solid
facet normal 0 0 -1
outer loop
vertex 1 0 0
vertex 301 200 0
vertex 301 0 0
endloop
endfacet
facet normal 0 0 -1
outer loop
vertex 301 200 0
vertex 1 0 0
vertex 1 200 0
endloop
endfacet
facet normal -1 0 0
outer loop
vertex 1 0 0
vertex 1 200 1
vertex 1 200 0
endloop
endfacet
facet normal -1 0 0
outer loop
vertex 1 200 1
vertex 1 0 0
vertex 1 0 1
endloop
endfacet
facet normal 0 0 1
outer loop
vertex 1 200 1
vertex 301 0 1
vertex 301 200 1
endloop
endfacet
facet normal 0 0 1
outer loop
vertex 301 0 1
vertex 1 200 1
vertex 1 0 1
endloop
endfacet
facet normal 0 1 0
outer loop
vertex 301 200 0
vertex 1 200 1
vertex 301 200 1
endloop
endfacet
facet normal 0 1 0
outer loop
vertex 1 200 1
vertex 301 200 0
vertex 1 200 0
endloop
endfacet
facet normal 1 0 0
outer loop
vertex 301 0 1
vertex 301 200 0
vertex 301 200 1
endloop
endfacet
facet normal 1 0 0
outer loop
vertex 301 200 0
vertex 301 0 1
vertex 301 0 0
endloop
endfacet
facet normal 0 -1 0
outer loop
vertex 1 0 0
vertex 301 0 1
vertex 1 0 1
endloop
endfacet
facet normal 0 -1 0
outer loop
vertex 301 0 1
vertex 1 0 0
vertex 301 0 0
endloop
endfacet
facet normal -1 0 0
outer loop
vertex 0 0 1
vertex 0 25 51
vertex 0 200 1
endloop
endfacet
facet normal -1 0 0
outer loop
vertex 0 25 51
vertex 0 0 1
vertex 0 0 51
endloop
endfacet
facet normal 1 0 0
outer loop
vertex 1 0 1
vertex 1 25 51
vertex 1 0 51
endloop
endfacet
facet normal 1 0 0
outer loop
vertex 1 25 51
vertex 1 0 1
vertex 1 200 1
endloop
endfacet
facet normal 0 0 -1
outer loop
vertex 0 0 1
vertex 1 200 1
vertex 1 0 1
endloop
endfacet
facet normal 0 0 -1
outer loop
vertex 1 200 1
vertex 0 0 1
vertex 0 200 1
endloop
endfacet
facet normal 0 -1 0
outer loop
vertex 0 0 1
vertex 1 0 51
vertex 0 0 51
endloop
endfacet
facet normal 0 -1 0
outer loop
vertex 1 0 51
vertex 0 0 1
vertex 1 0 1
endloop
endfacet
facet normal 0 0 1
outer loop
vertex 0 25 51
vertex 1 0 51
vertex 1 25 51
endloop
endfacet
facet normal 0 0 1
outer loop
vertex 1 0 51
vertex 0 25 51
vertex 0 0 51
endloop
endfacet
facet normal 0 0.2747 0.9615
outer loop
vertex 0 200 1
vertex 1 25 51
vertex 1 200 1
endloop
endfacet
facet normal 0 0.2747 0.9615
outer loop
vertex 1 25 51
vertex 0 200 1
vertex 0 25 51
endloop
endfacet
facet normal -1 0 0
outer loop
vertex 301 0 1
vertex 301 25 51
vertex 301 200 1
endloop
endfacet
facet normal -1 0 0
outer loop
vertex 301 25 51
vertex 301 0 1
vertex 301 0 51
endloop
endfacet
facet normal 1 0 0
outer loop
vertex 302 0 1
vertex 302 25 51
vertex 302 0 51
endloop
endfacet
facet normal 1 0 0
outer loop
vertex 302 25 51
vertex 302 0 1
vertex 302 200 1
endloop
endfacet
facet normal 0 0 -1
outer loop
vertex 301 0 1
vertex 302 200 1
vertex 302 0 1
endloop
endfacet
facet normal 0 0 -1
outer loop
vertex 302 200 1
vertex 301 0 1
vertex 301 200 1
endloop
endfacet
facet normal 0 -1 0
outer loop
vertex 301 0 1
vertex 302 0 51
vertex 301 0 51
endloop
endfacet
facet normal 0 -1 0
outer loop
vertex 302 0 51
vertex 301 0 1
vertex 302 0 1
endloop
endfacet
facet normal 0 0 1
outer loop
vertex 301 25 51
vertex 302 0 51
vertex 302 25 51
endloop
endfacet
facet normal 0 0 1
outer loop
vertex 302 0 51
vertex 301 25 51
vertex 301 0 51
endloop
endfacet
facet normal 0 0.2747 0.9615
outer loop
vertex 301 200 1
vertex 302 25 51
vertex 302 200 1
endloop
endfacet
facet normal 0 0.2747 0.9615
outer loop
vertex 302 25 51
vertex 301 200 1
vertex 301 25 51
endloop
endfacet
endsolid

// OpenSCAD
thickness=1;
width=300;
length=200;
depth=50;

boardThickness=25; //Thickness of the wooden board that will be the back panel. Can also just be used to round top corner.



module bottomPanel(){
square([width,length]);
}



module wing(){
  ;
    polygon(points=[[0,0],[0,boardThickness],[depth,length], [depth,0]]);
}


module threeD(){

translate([thickness,0,0])
linear_extrude(thickness)
bottomPanel();


translate([0,0,depth+thickness])
rotate([0,90,0])
linear_extrude(thickness)
wing();

translate([width+thickness,0,depth+thickness])
rotate([0,90,0])
linear_extrude(thickness)
wing();}


module flatPack(){
    
    translate([depth,0,0])
    bottomPanel();
    wing();
    
    translate([width+depth*2,0,0])
   mirror([1,0,0])
    wing();
    
}


//flatPack();
threeD();
